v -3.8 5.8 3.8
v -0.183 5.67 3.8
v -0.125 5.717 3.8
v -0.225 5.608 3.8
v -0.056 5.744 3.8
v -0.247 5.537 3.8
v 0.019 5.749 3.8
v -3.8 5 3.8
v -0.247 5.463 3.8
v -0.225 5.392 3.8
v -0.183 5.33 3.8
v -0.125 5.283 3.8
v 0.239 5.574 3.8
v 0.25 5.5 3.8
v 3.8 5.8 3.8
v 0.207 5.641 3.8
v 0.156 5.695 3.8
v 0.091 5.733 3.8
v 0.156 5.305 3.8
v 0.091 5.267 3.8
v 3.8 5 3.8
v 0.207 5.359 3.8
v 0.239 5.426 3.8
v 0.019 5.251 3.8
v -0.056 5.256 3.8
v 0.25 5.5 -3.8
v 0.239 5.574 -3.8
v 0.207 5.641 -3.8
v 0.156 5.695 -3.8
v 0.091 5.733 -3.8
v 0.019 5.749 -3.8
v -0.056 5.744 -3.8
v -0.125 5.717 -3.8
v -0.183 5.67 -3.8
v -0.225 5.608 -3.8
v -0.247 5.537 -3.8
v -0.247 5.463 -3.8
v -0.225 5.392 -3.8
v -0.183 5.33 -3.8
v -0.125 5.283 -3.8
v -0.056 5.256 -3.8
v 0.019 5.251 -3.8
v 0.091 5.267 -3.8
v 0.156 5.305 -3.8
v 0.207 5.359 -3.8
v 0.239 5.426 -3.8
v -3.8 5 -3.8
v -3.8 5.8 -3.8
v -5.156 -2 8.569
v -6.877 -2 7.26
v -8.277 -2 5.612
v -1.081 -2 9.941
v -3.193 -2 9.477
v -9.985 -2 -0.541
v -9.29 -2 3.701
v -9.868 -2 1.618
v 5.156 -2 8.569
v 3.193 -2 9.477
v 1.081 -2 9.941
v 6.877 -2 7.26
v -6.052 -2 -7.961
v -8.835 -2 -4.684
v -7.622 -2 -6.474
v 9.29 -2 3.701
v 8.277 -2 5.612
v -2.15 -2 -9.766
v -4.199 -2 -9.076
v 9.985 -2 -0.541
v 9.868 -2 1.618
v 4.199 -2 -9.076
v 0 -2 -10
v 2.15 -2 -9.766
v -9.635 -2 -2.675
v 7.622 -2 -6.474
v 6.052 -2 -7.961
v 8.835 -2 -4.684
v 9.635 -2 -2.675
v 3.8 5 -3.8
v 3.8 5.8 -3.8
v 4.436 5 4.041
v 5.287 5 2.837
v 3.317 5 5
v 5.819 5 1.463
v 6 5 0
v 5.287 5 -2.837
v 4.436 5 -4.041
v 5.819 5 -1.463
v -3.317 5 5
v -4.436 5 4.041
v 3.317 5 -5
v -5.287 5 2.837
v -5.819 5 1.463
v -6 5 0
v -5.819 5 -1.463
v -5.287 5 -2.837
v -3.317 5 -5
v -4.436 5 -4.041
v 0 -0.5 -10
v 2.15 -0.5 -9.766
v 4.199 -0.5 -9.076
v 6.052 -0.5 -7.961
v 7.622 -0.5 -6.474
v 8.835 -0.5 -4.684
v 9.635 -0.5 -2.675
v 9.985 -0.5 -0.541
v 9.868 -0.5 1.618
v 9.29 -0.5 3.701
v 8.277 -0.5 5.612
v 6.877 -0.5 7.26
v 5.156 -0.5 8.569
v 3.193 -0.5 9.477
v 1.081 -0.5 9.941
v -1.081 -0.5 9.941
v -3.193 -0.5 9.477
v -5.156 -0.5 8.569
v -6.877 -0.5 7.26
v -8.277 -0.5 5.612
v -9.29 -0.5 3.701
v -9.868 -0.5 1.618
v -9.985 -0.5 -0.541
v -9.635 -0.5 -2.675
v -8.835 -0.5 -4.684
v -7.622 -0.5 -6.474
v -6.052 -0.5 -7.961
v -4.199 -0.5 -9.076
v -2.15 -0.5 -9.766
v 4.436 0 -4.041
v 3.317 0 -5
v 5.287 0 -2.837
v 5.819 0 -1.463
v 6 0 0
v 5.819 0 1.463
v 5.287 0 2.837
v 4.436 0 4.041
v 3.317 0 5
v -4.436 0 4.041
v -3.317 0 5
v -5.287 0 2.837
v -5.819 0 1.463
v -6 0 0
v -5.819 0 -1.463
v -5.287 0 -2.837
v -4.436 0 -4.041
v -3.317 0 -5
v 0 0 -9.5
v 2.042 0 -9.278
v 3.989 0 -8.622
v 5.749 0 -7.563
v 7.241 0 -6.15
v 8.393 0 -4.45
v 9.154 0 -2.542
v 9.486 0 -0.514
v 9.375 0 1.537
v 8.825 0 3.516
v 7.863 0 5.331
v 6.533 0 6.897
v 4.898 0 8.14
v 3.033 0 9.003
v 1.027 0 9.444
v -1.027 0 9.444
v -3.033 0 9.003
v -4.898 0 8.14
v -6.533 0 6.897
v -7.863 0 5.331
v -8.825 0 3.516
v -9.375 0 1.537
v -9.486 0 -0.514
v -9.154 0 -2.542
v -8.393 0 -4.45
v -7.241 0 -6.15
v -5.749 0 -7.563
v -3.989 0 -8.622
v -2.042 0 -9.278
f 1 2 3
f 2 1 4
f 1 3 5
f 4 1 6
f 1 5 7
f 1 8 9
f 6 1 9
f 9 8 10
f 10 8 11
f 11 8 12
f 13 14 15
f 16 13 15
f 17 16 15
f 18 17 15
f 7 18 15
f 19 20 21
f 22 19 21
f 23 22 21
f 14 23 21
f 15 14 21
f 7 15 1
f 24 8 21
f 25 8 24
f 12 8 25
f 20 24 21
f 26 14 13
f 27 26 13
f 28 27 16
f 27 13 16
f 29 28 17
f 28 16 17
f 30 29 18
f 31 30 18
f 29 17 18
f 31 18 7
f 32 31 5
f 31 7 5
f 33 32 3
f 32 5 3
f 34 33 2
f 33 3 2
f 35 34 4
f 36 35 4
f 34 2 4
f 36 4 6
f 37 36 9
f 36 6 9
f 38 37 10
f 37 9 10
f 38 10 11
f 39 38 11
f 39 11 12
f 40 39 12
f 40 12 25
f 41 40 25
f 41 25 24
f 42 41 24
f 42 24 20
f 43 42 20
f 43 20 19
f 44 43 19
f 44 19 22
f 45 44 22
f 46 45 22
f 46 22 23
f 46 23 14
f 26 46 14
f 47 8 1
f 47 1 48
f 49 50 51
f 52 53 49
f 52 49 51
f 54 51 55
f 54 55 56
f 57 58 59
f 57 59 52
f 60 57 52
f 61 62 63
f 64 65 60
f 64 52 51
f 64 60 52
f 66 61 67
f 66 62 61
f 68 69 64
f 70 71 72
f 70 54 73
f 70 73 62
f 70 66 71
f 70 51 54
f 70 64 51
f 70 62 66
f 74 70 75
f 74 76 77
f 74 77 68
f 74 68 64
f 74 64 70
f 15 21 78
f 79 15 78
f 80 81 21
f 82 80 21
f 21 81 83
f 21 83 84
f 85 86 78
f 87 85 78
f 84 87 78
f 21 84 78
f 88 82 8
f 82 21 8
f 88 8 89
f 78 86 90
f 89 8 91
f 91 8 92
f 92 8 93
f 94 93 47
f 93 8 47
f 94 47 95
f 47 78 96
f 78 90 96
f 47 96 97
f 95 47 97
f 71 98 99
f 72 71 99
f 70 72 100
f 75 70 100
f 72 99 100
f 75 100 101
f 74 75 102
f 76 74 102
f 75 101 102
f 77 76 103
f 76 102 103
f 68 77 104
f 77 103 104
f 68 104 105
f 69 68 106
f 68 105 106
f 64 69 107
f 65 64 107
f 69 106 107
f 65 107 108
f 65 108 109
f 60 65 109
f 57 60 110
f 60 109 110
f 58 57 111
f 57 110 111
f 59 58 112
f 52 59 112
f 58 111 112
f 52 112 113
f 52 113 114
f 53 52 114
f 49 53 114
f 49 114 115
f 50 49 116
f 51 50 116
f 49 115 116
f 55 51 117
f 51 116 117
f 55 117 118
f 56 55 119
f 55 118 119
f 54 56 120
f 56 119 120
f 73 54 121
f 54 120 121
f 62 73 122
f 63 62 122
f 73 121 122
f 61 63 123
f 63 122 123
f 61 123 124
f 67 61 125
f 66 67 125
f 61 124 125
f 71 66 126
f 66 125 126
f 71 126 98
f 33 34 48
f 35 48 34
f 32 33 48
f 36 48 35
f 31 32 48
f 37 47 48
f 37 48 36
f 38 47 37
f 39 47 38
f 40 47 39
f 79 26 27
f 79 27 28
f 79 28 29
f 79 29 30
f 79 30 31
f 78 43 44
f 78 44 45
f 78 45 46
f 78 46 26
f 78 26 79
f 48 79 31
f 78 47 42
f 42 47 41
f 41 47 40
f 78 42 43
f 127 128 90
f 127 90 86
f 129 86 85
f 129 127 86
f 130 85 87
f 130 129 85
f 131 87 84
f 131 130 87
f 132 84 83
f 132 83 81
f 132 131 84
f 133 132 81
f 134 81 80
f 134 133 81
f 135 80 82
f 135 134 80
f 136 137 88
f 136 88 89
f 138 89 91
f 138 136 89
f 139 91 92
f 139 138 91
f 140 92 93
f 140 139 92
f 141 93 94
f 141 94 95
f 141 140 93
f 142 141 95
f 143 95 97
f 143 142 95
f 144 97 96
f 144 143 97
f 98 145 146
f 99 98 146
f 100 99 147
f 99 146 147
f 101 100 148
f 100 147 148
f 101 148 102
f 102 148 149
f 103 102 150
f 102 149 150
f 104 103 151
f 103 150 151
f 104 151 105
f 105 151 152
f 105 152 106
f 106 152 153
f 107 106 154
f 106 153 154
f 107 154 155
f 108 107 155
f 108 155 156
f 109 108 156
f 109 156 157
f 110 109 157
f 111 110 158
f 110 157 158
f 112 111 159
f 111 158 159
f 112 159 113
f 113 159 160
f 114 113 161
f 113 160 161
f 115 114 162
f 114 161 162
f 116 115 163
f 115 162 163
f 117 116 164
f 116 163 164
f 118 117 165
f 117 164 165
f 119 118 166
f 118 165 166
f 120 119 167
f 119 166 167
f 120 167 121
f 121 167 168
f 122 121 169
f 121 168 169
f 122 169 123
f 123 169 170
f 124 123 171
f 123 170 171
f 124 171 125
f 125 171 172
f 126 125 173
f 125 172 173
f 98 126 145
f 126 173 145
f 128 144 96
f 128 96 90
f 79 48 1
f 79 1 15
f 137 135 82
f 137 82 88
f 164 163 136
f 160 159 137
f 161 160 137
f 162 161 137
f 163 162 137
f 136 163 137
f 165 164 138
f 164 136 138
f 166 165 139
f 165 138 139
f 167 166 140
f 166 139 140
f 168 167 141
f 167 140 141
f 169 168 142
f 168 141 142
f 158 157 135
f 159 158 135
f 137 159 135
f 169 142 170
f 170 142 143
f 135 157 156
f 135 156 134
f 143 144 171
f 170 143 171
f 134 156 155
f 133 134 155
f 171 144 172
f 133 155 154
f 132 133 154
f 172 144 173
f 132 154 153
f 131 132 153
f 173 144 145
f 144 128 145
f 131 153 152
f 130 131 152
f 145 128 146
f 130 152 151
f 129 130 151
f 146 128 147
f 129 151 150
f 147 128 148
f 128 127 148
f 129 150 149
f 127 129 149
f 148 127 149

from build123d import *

# Parameters (mm, degrees)
ESTRUSIONE_ESTRUSIONE1_DEPTH = 5
SCHIZZO2_W                   = 7.6
SCHIZZO2_H                   = 7.6
ESTRUSIONE_ESTRUSIONE2_DEPTH = 0.8
SCHIZZO3_R                   = 0.25
TAGLIO_ESTRUSIONE1_DEPTH     = 13.127654349
SCHIZZO4_R                   = 10
ESTRUSIONE_ESTRUSIONE3_DEPTH = 2
SMUSSO1_SIZE                 = 0.5


with BuildPart() as part:
    # Schizzo1 → Estrusione-Estrusione1 (new body)
    with BuildSketch(Plane(origin=(0, 0, 0), x_dir=(1, 0, 0), z_dir=(0, 1, 0))):
        with BuildLine():
            Line((-3.31662479, 5), (3.31662479, 5))
            ThreePointArc((3.31662479, 5), (6, 0), (3.31662479, -5))
            Line((3.31662479, -5), (-3.31662479, -5))
            ThreePointArc((-3.31662479, -5), (-6, 0), (-3.31662479, 5))
        make_face()
    extrude(amount=ESTRUSIONE_ESTRUSIONE1_DEPTH)

    # Schizzo2 → Estrusione-Estrusione2 (add)
    with BuildSketch(Plane(origin=(0, 5, 0), x_dir=(1, 0, 0), z_dir=(0, 1, 0))):
        Rectangle(SCHIZZO2_W, SCHIZZO2_H)
    extrude(amount=ESTRUSIONE_ESTRUSIONE2_DEPTH)

    # Schizzo3 → Taglio-Estrusione1 (cut, through all)
    with BuildSketch(Plane.XY.offset(3.8)):
        with Locations((0, 5.5)):
            Circle(SCHIZZO3_R)
    extrude(amount=-TAGLIO_ESTRUSIONE1_DEPTH, mode=Mode.SUBTRACT)

    # Schizzo4 → Estrusione-Estrusione3 (add)
    with BuildSketch(Plane.XZ):
        with Locations(Location((0, 0, 0), (0, 0, 270))):
            Circle(SCHIZZO4_R)
    extrude(amount=ESTRUSIONE_ESTRUSIONE3_DEPTH)

    # Smusso1
    smusso1_edges = [part.edges().sort_by_distance(p)[0] for p in [
        (0, 0, 10),
    ]]
    chamfer(smusso1_edges, length=SMUSSO1_SIZE)


solid = part.part
